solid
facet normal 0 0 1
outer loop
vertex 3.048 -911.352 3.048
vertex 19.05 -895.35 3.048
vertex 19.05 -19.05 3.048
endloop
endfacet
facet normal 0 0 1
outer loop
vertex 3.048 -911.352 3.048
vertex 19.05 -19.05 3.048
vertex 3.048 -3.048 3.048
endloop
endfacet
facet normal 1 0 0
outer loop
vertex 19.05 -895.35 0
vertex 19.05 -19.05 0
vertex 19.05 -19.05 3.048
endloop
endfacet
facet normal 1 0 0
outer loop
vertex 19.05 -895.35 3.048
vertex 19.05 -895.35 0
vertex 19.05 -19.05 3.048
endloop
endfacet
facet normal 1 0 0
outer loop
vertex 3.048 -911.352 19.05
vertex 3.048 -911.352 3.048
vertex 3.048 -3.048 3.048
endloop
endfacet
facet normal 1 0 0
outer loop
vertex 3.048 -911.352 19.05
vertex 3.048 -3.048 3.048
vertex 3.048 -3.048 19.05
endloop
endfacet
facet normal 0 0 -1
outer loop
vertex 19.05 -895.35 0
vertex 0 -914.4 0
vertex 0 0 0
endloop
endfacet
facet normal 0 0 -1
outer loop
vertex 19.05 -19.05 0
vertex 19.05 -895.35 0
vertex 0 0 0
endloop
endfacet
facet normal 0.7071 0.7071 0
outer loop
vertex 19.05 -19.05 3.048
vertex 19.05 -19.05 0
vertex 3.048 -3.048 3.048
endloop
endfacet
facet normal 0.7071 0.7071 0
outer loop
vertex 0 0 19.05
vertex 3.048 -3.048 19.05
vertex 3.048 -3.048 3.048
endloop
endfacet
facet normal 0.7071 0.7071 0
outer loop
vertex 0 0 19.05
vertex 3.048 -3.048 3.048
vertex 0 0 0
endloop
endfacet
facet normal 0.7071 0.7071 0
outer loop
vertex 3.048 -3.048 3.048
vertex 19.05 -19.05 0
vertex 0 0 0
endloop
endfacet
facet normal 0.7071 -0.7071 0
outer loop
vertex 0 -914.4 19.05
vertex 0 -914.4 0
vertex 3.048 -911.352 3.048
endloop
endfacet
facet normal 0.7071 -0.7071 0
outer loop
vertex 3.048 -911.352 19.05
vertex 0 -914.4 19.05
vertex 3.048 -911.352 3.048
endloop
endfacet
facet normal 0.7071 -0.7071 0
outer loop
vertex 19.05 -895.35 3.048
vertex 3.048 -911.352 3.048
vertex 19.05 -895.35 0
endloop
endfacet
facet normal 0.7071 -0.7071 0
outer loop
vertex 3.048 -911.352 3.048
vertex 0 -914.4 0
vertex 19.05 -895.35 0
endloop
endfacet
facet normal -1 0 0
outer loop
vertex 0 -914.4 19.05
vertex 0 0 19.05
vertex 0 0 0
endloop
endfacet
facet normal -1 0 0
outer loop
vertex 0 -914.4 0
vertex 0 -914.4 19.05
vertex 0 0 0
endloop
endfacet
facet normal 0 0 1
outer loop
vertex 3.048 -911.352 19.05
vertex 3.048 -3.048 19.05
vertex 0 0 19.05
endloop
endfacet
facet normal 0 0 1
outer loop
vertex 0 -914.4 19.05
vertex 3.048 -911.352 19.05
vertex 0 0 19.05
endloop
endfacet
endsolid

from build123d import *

# Parameters (mm, degrees)
F1_DEPTH = 914.4
F3_DEPTH = 19.051
F5_DEPTH = 19.051


with BuildPart() as f1:
    # F0 (on Front) → F1 (new body)
    with BuildSketch(Plane.XZ):
        Polygon((0, 19.05), (0, 0), (19.05, 0), (19.05, 3.048), (3.048, 3.048), (3.048, 19.05), align=None)
    extrude(amount=F1_DEPTH)

    # F2 (on face) → F3 (cut, through all)
    with BuildSketch(Plane(origin=(0, 0, 0), x_dir=(1, 0, 0), z_dir=(0, 0, -1))):
        Polygon((19.05, 914.4), (0, 914.4), (19.05, 895.35), align=None)
    extrude(amount=-F3_DEPTH, mode=Mode.SUBTRACT)

    # F4 (on face) → F5 (cut, through all)
    with BuildSketch(Plane(origin=(0, 0, 0), x_dir=(1, 0, 0), z_dir=(0, 0, -1))):
        Polygon((19.05, 19.05), (0, 0), (19.05, 0), align=None)
    extrude(amount=-F5_DEPTH, mode=Mode.SUBTRACT)


solid = f1.part
